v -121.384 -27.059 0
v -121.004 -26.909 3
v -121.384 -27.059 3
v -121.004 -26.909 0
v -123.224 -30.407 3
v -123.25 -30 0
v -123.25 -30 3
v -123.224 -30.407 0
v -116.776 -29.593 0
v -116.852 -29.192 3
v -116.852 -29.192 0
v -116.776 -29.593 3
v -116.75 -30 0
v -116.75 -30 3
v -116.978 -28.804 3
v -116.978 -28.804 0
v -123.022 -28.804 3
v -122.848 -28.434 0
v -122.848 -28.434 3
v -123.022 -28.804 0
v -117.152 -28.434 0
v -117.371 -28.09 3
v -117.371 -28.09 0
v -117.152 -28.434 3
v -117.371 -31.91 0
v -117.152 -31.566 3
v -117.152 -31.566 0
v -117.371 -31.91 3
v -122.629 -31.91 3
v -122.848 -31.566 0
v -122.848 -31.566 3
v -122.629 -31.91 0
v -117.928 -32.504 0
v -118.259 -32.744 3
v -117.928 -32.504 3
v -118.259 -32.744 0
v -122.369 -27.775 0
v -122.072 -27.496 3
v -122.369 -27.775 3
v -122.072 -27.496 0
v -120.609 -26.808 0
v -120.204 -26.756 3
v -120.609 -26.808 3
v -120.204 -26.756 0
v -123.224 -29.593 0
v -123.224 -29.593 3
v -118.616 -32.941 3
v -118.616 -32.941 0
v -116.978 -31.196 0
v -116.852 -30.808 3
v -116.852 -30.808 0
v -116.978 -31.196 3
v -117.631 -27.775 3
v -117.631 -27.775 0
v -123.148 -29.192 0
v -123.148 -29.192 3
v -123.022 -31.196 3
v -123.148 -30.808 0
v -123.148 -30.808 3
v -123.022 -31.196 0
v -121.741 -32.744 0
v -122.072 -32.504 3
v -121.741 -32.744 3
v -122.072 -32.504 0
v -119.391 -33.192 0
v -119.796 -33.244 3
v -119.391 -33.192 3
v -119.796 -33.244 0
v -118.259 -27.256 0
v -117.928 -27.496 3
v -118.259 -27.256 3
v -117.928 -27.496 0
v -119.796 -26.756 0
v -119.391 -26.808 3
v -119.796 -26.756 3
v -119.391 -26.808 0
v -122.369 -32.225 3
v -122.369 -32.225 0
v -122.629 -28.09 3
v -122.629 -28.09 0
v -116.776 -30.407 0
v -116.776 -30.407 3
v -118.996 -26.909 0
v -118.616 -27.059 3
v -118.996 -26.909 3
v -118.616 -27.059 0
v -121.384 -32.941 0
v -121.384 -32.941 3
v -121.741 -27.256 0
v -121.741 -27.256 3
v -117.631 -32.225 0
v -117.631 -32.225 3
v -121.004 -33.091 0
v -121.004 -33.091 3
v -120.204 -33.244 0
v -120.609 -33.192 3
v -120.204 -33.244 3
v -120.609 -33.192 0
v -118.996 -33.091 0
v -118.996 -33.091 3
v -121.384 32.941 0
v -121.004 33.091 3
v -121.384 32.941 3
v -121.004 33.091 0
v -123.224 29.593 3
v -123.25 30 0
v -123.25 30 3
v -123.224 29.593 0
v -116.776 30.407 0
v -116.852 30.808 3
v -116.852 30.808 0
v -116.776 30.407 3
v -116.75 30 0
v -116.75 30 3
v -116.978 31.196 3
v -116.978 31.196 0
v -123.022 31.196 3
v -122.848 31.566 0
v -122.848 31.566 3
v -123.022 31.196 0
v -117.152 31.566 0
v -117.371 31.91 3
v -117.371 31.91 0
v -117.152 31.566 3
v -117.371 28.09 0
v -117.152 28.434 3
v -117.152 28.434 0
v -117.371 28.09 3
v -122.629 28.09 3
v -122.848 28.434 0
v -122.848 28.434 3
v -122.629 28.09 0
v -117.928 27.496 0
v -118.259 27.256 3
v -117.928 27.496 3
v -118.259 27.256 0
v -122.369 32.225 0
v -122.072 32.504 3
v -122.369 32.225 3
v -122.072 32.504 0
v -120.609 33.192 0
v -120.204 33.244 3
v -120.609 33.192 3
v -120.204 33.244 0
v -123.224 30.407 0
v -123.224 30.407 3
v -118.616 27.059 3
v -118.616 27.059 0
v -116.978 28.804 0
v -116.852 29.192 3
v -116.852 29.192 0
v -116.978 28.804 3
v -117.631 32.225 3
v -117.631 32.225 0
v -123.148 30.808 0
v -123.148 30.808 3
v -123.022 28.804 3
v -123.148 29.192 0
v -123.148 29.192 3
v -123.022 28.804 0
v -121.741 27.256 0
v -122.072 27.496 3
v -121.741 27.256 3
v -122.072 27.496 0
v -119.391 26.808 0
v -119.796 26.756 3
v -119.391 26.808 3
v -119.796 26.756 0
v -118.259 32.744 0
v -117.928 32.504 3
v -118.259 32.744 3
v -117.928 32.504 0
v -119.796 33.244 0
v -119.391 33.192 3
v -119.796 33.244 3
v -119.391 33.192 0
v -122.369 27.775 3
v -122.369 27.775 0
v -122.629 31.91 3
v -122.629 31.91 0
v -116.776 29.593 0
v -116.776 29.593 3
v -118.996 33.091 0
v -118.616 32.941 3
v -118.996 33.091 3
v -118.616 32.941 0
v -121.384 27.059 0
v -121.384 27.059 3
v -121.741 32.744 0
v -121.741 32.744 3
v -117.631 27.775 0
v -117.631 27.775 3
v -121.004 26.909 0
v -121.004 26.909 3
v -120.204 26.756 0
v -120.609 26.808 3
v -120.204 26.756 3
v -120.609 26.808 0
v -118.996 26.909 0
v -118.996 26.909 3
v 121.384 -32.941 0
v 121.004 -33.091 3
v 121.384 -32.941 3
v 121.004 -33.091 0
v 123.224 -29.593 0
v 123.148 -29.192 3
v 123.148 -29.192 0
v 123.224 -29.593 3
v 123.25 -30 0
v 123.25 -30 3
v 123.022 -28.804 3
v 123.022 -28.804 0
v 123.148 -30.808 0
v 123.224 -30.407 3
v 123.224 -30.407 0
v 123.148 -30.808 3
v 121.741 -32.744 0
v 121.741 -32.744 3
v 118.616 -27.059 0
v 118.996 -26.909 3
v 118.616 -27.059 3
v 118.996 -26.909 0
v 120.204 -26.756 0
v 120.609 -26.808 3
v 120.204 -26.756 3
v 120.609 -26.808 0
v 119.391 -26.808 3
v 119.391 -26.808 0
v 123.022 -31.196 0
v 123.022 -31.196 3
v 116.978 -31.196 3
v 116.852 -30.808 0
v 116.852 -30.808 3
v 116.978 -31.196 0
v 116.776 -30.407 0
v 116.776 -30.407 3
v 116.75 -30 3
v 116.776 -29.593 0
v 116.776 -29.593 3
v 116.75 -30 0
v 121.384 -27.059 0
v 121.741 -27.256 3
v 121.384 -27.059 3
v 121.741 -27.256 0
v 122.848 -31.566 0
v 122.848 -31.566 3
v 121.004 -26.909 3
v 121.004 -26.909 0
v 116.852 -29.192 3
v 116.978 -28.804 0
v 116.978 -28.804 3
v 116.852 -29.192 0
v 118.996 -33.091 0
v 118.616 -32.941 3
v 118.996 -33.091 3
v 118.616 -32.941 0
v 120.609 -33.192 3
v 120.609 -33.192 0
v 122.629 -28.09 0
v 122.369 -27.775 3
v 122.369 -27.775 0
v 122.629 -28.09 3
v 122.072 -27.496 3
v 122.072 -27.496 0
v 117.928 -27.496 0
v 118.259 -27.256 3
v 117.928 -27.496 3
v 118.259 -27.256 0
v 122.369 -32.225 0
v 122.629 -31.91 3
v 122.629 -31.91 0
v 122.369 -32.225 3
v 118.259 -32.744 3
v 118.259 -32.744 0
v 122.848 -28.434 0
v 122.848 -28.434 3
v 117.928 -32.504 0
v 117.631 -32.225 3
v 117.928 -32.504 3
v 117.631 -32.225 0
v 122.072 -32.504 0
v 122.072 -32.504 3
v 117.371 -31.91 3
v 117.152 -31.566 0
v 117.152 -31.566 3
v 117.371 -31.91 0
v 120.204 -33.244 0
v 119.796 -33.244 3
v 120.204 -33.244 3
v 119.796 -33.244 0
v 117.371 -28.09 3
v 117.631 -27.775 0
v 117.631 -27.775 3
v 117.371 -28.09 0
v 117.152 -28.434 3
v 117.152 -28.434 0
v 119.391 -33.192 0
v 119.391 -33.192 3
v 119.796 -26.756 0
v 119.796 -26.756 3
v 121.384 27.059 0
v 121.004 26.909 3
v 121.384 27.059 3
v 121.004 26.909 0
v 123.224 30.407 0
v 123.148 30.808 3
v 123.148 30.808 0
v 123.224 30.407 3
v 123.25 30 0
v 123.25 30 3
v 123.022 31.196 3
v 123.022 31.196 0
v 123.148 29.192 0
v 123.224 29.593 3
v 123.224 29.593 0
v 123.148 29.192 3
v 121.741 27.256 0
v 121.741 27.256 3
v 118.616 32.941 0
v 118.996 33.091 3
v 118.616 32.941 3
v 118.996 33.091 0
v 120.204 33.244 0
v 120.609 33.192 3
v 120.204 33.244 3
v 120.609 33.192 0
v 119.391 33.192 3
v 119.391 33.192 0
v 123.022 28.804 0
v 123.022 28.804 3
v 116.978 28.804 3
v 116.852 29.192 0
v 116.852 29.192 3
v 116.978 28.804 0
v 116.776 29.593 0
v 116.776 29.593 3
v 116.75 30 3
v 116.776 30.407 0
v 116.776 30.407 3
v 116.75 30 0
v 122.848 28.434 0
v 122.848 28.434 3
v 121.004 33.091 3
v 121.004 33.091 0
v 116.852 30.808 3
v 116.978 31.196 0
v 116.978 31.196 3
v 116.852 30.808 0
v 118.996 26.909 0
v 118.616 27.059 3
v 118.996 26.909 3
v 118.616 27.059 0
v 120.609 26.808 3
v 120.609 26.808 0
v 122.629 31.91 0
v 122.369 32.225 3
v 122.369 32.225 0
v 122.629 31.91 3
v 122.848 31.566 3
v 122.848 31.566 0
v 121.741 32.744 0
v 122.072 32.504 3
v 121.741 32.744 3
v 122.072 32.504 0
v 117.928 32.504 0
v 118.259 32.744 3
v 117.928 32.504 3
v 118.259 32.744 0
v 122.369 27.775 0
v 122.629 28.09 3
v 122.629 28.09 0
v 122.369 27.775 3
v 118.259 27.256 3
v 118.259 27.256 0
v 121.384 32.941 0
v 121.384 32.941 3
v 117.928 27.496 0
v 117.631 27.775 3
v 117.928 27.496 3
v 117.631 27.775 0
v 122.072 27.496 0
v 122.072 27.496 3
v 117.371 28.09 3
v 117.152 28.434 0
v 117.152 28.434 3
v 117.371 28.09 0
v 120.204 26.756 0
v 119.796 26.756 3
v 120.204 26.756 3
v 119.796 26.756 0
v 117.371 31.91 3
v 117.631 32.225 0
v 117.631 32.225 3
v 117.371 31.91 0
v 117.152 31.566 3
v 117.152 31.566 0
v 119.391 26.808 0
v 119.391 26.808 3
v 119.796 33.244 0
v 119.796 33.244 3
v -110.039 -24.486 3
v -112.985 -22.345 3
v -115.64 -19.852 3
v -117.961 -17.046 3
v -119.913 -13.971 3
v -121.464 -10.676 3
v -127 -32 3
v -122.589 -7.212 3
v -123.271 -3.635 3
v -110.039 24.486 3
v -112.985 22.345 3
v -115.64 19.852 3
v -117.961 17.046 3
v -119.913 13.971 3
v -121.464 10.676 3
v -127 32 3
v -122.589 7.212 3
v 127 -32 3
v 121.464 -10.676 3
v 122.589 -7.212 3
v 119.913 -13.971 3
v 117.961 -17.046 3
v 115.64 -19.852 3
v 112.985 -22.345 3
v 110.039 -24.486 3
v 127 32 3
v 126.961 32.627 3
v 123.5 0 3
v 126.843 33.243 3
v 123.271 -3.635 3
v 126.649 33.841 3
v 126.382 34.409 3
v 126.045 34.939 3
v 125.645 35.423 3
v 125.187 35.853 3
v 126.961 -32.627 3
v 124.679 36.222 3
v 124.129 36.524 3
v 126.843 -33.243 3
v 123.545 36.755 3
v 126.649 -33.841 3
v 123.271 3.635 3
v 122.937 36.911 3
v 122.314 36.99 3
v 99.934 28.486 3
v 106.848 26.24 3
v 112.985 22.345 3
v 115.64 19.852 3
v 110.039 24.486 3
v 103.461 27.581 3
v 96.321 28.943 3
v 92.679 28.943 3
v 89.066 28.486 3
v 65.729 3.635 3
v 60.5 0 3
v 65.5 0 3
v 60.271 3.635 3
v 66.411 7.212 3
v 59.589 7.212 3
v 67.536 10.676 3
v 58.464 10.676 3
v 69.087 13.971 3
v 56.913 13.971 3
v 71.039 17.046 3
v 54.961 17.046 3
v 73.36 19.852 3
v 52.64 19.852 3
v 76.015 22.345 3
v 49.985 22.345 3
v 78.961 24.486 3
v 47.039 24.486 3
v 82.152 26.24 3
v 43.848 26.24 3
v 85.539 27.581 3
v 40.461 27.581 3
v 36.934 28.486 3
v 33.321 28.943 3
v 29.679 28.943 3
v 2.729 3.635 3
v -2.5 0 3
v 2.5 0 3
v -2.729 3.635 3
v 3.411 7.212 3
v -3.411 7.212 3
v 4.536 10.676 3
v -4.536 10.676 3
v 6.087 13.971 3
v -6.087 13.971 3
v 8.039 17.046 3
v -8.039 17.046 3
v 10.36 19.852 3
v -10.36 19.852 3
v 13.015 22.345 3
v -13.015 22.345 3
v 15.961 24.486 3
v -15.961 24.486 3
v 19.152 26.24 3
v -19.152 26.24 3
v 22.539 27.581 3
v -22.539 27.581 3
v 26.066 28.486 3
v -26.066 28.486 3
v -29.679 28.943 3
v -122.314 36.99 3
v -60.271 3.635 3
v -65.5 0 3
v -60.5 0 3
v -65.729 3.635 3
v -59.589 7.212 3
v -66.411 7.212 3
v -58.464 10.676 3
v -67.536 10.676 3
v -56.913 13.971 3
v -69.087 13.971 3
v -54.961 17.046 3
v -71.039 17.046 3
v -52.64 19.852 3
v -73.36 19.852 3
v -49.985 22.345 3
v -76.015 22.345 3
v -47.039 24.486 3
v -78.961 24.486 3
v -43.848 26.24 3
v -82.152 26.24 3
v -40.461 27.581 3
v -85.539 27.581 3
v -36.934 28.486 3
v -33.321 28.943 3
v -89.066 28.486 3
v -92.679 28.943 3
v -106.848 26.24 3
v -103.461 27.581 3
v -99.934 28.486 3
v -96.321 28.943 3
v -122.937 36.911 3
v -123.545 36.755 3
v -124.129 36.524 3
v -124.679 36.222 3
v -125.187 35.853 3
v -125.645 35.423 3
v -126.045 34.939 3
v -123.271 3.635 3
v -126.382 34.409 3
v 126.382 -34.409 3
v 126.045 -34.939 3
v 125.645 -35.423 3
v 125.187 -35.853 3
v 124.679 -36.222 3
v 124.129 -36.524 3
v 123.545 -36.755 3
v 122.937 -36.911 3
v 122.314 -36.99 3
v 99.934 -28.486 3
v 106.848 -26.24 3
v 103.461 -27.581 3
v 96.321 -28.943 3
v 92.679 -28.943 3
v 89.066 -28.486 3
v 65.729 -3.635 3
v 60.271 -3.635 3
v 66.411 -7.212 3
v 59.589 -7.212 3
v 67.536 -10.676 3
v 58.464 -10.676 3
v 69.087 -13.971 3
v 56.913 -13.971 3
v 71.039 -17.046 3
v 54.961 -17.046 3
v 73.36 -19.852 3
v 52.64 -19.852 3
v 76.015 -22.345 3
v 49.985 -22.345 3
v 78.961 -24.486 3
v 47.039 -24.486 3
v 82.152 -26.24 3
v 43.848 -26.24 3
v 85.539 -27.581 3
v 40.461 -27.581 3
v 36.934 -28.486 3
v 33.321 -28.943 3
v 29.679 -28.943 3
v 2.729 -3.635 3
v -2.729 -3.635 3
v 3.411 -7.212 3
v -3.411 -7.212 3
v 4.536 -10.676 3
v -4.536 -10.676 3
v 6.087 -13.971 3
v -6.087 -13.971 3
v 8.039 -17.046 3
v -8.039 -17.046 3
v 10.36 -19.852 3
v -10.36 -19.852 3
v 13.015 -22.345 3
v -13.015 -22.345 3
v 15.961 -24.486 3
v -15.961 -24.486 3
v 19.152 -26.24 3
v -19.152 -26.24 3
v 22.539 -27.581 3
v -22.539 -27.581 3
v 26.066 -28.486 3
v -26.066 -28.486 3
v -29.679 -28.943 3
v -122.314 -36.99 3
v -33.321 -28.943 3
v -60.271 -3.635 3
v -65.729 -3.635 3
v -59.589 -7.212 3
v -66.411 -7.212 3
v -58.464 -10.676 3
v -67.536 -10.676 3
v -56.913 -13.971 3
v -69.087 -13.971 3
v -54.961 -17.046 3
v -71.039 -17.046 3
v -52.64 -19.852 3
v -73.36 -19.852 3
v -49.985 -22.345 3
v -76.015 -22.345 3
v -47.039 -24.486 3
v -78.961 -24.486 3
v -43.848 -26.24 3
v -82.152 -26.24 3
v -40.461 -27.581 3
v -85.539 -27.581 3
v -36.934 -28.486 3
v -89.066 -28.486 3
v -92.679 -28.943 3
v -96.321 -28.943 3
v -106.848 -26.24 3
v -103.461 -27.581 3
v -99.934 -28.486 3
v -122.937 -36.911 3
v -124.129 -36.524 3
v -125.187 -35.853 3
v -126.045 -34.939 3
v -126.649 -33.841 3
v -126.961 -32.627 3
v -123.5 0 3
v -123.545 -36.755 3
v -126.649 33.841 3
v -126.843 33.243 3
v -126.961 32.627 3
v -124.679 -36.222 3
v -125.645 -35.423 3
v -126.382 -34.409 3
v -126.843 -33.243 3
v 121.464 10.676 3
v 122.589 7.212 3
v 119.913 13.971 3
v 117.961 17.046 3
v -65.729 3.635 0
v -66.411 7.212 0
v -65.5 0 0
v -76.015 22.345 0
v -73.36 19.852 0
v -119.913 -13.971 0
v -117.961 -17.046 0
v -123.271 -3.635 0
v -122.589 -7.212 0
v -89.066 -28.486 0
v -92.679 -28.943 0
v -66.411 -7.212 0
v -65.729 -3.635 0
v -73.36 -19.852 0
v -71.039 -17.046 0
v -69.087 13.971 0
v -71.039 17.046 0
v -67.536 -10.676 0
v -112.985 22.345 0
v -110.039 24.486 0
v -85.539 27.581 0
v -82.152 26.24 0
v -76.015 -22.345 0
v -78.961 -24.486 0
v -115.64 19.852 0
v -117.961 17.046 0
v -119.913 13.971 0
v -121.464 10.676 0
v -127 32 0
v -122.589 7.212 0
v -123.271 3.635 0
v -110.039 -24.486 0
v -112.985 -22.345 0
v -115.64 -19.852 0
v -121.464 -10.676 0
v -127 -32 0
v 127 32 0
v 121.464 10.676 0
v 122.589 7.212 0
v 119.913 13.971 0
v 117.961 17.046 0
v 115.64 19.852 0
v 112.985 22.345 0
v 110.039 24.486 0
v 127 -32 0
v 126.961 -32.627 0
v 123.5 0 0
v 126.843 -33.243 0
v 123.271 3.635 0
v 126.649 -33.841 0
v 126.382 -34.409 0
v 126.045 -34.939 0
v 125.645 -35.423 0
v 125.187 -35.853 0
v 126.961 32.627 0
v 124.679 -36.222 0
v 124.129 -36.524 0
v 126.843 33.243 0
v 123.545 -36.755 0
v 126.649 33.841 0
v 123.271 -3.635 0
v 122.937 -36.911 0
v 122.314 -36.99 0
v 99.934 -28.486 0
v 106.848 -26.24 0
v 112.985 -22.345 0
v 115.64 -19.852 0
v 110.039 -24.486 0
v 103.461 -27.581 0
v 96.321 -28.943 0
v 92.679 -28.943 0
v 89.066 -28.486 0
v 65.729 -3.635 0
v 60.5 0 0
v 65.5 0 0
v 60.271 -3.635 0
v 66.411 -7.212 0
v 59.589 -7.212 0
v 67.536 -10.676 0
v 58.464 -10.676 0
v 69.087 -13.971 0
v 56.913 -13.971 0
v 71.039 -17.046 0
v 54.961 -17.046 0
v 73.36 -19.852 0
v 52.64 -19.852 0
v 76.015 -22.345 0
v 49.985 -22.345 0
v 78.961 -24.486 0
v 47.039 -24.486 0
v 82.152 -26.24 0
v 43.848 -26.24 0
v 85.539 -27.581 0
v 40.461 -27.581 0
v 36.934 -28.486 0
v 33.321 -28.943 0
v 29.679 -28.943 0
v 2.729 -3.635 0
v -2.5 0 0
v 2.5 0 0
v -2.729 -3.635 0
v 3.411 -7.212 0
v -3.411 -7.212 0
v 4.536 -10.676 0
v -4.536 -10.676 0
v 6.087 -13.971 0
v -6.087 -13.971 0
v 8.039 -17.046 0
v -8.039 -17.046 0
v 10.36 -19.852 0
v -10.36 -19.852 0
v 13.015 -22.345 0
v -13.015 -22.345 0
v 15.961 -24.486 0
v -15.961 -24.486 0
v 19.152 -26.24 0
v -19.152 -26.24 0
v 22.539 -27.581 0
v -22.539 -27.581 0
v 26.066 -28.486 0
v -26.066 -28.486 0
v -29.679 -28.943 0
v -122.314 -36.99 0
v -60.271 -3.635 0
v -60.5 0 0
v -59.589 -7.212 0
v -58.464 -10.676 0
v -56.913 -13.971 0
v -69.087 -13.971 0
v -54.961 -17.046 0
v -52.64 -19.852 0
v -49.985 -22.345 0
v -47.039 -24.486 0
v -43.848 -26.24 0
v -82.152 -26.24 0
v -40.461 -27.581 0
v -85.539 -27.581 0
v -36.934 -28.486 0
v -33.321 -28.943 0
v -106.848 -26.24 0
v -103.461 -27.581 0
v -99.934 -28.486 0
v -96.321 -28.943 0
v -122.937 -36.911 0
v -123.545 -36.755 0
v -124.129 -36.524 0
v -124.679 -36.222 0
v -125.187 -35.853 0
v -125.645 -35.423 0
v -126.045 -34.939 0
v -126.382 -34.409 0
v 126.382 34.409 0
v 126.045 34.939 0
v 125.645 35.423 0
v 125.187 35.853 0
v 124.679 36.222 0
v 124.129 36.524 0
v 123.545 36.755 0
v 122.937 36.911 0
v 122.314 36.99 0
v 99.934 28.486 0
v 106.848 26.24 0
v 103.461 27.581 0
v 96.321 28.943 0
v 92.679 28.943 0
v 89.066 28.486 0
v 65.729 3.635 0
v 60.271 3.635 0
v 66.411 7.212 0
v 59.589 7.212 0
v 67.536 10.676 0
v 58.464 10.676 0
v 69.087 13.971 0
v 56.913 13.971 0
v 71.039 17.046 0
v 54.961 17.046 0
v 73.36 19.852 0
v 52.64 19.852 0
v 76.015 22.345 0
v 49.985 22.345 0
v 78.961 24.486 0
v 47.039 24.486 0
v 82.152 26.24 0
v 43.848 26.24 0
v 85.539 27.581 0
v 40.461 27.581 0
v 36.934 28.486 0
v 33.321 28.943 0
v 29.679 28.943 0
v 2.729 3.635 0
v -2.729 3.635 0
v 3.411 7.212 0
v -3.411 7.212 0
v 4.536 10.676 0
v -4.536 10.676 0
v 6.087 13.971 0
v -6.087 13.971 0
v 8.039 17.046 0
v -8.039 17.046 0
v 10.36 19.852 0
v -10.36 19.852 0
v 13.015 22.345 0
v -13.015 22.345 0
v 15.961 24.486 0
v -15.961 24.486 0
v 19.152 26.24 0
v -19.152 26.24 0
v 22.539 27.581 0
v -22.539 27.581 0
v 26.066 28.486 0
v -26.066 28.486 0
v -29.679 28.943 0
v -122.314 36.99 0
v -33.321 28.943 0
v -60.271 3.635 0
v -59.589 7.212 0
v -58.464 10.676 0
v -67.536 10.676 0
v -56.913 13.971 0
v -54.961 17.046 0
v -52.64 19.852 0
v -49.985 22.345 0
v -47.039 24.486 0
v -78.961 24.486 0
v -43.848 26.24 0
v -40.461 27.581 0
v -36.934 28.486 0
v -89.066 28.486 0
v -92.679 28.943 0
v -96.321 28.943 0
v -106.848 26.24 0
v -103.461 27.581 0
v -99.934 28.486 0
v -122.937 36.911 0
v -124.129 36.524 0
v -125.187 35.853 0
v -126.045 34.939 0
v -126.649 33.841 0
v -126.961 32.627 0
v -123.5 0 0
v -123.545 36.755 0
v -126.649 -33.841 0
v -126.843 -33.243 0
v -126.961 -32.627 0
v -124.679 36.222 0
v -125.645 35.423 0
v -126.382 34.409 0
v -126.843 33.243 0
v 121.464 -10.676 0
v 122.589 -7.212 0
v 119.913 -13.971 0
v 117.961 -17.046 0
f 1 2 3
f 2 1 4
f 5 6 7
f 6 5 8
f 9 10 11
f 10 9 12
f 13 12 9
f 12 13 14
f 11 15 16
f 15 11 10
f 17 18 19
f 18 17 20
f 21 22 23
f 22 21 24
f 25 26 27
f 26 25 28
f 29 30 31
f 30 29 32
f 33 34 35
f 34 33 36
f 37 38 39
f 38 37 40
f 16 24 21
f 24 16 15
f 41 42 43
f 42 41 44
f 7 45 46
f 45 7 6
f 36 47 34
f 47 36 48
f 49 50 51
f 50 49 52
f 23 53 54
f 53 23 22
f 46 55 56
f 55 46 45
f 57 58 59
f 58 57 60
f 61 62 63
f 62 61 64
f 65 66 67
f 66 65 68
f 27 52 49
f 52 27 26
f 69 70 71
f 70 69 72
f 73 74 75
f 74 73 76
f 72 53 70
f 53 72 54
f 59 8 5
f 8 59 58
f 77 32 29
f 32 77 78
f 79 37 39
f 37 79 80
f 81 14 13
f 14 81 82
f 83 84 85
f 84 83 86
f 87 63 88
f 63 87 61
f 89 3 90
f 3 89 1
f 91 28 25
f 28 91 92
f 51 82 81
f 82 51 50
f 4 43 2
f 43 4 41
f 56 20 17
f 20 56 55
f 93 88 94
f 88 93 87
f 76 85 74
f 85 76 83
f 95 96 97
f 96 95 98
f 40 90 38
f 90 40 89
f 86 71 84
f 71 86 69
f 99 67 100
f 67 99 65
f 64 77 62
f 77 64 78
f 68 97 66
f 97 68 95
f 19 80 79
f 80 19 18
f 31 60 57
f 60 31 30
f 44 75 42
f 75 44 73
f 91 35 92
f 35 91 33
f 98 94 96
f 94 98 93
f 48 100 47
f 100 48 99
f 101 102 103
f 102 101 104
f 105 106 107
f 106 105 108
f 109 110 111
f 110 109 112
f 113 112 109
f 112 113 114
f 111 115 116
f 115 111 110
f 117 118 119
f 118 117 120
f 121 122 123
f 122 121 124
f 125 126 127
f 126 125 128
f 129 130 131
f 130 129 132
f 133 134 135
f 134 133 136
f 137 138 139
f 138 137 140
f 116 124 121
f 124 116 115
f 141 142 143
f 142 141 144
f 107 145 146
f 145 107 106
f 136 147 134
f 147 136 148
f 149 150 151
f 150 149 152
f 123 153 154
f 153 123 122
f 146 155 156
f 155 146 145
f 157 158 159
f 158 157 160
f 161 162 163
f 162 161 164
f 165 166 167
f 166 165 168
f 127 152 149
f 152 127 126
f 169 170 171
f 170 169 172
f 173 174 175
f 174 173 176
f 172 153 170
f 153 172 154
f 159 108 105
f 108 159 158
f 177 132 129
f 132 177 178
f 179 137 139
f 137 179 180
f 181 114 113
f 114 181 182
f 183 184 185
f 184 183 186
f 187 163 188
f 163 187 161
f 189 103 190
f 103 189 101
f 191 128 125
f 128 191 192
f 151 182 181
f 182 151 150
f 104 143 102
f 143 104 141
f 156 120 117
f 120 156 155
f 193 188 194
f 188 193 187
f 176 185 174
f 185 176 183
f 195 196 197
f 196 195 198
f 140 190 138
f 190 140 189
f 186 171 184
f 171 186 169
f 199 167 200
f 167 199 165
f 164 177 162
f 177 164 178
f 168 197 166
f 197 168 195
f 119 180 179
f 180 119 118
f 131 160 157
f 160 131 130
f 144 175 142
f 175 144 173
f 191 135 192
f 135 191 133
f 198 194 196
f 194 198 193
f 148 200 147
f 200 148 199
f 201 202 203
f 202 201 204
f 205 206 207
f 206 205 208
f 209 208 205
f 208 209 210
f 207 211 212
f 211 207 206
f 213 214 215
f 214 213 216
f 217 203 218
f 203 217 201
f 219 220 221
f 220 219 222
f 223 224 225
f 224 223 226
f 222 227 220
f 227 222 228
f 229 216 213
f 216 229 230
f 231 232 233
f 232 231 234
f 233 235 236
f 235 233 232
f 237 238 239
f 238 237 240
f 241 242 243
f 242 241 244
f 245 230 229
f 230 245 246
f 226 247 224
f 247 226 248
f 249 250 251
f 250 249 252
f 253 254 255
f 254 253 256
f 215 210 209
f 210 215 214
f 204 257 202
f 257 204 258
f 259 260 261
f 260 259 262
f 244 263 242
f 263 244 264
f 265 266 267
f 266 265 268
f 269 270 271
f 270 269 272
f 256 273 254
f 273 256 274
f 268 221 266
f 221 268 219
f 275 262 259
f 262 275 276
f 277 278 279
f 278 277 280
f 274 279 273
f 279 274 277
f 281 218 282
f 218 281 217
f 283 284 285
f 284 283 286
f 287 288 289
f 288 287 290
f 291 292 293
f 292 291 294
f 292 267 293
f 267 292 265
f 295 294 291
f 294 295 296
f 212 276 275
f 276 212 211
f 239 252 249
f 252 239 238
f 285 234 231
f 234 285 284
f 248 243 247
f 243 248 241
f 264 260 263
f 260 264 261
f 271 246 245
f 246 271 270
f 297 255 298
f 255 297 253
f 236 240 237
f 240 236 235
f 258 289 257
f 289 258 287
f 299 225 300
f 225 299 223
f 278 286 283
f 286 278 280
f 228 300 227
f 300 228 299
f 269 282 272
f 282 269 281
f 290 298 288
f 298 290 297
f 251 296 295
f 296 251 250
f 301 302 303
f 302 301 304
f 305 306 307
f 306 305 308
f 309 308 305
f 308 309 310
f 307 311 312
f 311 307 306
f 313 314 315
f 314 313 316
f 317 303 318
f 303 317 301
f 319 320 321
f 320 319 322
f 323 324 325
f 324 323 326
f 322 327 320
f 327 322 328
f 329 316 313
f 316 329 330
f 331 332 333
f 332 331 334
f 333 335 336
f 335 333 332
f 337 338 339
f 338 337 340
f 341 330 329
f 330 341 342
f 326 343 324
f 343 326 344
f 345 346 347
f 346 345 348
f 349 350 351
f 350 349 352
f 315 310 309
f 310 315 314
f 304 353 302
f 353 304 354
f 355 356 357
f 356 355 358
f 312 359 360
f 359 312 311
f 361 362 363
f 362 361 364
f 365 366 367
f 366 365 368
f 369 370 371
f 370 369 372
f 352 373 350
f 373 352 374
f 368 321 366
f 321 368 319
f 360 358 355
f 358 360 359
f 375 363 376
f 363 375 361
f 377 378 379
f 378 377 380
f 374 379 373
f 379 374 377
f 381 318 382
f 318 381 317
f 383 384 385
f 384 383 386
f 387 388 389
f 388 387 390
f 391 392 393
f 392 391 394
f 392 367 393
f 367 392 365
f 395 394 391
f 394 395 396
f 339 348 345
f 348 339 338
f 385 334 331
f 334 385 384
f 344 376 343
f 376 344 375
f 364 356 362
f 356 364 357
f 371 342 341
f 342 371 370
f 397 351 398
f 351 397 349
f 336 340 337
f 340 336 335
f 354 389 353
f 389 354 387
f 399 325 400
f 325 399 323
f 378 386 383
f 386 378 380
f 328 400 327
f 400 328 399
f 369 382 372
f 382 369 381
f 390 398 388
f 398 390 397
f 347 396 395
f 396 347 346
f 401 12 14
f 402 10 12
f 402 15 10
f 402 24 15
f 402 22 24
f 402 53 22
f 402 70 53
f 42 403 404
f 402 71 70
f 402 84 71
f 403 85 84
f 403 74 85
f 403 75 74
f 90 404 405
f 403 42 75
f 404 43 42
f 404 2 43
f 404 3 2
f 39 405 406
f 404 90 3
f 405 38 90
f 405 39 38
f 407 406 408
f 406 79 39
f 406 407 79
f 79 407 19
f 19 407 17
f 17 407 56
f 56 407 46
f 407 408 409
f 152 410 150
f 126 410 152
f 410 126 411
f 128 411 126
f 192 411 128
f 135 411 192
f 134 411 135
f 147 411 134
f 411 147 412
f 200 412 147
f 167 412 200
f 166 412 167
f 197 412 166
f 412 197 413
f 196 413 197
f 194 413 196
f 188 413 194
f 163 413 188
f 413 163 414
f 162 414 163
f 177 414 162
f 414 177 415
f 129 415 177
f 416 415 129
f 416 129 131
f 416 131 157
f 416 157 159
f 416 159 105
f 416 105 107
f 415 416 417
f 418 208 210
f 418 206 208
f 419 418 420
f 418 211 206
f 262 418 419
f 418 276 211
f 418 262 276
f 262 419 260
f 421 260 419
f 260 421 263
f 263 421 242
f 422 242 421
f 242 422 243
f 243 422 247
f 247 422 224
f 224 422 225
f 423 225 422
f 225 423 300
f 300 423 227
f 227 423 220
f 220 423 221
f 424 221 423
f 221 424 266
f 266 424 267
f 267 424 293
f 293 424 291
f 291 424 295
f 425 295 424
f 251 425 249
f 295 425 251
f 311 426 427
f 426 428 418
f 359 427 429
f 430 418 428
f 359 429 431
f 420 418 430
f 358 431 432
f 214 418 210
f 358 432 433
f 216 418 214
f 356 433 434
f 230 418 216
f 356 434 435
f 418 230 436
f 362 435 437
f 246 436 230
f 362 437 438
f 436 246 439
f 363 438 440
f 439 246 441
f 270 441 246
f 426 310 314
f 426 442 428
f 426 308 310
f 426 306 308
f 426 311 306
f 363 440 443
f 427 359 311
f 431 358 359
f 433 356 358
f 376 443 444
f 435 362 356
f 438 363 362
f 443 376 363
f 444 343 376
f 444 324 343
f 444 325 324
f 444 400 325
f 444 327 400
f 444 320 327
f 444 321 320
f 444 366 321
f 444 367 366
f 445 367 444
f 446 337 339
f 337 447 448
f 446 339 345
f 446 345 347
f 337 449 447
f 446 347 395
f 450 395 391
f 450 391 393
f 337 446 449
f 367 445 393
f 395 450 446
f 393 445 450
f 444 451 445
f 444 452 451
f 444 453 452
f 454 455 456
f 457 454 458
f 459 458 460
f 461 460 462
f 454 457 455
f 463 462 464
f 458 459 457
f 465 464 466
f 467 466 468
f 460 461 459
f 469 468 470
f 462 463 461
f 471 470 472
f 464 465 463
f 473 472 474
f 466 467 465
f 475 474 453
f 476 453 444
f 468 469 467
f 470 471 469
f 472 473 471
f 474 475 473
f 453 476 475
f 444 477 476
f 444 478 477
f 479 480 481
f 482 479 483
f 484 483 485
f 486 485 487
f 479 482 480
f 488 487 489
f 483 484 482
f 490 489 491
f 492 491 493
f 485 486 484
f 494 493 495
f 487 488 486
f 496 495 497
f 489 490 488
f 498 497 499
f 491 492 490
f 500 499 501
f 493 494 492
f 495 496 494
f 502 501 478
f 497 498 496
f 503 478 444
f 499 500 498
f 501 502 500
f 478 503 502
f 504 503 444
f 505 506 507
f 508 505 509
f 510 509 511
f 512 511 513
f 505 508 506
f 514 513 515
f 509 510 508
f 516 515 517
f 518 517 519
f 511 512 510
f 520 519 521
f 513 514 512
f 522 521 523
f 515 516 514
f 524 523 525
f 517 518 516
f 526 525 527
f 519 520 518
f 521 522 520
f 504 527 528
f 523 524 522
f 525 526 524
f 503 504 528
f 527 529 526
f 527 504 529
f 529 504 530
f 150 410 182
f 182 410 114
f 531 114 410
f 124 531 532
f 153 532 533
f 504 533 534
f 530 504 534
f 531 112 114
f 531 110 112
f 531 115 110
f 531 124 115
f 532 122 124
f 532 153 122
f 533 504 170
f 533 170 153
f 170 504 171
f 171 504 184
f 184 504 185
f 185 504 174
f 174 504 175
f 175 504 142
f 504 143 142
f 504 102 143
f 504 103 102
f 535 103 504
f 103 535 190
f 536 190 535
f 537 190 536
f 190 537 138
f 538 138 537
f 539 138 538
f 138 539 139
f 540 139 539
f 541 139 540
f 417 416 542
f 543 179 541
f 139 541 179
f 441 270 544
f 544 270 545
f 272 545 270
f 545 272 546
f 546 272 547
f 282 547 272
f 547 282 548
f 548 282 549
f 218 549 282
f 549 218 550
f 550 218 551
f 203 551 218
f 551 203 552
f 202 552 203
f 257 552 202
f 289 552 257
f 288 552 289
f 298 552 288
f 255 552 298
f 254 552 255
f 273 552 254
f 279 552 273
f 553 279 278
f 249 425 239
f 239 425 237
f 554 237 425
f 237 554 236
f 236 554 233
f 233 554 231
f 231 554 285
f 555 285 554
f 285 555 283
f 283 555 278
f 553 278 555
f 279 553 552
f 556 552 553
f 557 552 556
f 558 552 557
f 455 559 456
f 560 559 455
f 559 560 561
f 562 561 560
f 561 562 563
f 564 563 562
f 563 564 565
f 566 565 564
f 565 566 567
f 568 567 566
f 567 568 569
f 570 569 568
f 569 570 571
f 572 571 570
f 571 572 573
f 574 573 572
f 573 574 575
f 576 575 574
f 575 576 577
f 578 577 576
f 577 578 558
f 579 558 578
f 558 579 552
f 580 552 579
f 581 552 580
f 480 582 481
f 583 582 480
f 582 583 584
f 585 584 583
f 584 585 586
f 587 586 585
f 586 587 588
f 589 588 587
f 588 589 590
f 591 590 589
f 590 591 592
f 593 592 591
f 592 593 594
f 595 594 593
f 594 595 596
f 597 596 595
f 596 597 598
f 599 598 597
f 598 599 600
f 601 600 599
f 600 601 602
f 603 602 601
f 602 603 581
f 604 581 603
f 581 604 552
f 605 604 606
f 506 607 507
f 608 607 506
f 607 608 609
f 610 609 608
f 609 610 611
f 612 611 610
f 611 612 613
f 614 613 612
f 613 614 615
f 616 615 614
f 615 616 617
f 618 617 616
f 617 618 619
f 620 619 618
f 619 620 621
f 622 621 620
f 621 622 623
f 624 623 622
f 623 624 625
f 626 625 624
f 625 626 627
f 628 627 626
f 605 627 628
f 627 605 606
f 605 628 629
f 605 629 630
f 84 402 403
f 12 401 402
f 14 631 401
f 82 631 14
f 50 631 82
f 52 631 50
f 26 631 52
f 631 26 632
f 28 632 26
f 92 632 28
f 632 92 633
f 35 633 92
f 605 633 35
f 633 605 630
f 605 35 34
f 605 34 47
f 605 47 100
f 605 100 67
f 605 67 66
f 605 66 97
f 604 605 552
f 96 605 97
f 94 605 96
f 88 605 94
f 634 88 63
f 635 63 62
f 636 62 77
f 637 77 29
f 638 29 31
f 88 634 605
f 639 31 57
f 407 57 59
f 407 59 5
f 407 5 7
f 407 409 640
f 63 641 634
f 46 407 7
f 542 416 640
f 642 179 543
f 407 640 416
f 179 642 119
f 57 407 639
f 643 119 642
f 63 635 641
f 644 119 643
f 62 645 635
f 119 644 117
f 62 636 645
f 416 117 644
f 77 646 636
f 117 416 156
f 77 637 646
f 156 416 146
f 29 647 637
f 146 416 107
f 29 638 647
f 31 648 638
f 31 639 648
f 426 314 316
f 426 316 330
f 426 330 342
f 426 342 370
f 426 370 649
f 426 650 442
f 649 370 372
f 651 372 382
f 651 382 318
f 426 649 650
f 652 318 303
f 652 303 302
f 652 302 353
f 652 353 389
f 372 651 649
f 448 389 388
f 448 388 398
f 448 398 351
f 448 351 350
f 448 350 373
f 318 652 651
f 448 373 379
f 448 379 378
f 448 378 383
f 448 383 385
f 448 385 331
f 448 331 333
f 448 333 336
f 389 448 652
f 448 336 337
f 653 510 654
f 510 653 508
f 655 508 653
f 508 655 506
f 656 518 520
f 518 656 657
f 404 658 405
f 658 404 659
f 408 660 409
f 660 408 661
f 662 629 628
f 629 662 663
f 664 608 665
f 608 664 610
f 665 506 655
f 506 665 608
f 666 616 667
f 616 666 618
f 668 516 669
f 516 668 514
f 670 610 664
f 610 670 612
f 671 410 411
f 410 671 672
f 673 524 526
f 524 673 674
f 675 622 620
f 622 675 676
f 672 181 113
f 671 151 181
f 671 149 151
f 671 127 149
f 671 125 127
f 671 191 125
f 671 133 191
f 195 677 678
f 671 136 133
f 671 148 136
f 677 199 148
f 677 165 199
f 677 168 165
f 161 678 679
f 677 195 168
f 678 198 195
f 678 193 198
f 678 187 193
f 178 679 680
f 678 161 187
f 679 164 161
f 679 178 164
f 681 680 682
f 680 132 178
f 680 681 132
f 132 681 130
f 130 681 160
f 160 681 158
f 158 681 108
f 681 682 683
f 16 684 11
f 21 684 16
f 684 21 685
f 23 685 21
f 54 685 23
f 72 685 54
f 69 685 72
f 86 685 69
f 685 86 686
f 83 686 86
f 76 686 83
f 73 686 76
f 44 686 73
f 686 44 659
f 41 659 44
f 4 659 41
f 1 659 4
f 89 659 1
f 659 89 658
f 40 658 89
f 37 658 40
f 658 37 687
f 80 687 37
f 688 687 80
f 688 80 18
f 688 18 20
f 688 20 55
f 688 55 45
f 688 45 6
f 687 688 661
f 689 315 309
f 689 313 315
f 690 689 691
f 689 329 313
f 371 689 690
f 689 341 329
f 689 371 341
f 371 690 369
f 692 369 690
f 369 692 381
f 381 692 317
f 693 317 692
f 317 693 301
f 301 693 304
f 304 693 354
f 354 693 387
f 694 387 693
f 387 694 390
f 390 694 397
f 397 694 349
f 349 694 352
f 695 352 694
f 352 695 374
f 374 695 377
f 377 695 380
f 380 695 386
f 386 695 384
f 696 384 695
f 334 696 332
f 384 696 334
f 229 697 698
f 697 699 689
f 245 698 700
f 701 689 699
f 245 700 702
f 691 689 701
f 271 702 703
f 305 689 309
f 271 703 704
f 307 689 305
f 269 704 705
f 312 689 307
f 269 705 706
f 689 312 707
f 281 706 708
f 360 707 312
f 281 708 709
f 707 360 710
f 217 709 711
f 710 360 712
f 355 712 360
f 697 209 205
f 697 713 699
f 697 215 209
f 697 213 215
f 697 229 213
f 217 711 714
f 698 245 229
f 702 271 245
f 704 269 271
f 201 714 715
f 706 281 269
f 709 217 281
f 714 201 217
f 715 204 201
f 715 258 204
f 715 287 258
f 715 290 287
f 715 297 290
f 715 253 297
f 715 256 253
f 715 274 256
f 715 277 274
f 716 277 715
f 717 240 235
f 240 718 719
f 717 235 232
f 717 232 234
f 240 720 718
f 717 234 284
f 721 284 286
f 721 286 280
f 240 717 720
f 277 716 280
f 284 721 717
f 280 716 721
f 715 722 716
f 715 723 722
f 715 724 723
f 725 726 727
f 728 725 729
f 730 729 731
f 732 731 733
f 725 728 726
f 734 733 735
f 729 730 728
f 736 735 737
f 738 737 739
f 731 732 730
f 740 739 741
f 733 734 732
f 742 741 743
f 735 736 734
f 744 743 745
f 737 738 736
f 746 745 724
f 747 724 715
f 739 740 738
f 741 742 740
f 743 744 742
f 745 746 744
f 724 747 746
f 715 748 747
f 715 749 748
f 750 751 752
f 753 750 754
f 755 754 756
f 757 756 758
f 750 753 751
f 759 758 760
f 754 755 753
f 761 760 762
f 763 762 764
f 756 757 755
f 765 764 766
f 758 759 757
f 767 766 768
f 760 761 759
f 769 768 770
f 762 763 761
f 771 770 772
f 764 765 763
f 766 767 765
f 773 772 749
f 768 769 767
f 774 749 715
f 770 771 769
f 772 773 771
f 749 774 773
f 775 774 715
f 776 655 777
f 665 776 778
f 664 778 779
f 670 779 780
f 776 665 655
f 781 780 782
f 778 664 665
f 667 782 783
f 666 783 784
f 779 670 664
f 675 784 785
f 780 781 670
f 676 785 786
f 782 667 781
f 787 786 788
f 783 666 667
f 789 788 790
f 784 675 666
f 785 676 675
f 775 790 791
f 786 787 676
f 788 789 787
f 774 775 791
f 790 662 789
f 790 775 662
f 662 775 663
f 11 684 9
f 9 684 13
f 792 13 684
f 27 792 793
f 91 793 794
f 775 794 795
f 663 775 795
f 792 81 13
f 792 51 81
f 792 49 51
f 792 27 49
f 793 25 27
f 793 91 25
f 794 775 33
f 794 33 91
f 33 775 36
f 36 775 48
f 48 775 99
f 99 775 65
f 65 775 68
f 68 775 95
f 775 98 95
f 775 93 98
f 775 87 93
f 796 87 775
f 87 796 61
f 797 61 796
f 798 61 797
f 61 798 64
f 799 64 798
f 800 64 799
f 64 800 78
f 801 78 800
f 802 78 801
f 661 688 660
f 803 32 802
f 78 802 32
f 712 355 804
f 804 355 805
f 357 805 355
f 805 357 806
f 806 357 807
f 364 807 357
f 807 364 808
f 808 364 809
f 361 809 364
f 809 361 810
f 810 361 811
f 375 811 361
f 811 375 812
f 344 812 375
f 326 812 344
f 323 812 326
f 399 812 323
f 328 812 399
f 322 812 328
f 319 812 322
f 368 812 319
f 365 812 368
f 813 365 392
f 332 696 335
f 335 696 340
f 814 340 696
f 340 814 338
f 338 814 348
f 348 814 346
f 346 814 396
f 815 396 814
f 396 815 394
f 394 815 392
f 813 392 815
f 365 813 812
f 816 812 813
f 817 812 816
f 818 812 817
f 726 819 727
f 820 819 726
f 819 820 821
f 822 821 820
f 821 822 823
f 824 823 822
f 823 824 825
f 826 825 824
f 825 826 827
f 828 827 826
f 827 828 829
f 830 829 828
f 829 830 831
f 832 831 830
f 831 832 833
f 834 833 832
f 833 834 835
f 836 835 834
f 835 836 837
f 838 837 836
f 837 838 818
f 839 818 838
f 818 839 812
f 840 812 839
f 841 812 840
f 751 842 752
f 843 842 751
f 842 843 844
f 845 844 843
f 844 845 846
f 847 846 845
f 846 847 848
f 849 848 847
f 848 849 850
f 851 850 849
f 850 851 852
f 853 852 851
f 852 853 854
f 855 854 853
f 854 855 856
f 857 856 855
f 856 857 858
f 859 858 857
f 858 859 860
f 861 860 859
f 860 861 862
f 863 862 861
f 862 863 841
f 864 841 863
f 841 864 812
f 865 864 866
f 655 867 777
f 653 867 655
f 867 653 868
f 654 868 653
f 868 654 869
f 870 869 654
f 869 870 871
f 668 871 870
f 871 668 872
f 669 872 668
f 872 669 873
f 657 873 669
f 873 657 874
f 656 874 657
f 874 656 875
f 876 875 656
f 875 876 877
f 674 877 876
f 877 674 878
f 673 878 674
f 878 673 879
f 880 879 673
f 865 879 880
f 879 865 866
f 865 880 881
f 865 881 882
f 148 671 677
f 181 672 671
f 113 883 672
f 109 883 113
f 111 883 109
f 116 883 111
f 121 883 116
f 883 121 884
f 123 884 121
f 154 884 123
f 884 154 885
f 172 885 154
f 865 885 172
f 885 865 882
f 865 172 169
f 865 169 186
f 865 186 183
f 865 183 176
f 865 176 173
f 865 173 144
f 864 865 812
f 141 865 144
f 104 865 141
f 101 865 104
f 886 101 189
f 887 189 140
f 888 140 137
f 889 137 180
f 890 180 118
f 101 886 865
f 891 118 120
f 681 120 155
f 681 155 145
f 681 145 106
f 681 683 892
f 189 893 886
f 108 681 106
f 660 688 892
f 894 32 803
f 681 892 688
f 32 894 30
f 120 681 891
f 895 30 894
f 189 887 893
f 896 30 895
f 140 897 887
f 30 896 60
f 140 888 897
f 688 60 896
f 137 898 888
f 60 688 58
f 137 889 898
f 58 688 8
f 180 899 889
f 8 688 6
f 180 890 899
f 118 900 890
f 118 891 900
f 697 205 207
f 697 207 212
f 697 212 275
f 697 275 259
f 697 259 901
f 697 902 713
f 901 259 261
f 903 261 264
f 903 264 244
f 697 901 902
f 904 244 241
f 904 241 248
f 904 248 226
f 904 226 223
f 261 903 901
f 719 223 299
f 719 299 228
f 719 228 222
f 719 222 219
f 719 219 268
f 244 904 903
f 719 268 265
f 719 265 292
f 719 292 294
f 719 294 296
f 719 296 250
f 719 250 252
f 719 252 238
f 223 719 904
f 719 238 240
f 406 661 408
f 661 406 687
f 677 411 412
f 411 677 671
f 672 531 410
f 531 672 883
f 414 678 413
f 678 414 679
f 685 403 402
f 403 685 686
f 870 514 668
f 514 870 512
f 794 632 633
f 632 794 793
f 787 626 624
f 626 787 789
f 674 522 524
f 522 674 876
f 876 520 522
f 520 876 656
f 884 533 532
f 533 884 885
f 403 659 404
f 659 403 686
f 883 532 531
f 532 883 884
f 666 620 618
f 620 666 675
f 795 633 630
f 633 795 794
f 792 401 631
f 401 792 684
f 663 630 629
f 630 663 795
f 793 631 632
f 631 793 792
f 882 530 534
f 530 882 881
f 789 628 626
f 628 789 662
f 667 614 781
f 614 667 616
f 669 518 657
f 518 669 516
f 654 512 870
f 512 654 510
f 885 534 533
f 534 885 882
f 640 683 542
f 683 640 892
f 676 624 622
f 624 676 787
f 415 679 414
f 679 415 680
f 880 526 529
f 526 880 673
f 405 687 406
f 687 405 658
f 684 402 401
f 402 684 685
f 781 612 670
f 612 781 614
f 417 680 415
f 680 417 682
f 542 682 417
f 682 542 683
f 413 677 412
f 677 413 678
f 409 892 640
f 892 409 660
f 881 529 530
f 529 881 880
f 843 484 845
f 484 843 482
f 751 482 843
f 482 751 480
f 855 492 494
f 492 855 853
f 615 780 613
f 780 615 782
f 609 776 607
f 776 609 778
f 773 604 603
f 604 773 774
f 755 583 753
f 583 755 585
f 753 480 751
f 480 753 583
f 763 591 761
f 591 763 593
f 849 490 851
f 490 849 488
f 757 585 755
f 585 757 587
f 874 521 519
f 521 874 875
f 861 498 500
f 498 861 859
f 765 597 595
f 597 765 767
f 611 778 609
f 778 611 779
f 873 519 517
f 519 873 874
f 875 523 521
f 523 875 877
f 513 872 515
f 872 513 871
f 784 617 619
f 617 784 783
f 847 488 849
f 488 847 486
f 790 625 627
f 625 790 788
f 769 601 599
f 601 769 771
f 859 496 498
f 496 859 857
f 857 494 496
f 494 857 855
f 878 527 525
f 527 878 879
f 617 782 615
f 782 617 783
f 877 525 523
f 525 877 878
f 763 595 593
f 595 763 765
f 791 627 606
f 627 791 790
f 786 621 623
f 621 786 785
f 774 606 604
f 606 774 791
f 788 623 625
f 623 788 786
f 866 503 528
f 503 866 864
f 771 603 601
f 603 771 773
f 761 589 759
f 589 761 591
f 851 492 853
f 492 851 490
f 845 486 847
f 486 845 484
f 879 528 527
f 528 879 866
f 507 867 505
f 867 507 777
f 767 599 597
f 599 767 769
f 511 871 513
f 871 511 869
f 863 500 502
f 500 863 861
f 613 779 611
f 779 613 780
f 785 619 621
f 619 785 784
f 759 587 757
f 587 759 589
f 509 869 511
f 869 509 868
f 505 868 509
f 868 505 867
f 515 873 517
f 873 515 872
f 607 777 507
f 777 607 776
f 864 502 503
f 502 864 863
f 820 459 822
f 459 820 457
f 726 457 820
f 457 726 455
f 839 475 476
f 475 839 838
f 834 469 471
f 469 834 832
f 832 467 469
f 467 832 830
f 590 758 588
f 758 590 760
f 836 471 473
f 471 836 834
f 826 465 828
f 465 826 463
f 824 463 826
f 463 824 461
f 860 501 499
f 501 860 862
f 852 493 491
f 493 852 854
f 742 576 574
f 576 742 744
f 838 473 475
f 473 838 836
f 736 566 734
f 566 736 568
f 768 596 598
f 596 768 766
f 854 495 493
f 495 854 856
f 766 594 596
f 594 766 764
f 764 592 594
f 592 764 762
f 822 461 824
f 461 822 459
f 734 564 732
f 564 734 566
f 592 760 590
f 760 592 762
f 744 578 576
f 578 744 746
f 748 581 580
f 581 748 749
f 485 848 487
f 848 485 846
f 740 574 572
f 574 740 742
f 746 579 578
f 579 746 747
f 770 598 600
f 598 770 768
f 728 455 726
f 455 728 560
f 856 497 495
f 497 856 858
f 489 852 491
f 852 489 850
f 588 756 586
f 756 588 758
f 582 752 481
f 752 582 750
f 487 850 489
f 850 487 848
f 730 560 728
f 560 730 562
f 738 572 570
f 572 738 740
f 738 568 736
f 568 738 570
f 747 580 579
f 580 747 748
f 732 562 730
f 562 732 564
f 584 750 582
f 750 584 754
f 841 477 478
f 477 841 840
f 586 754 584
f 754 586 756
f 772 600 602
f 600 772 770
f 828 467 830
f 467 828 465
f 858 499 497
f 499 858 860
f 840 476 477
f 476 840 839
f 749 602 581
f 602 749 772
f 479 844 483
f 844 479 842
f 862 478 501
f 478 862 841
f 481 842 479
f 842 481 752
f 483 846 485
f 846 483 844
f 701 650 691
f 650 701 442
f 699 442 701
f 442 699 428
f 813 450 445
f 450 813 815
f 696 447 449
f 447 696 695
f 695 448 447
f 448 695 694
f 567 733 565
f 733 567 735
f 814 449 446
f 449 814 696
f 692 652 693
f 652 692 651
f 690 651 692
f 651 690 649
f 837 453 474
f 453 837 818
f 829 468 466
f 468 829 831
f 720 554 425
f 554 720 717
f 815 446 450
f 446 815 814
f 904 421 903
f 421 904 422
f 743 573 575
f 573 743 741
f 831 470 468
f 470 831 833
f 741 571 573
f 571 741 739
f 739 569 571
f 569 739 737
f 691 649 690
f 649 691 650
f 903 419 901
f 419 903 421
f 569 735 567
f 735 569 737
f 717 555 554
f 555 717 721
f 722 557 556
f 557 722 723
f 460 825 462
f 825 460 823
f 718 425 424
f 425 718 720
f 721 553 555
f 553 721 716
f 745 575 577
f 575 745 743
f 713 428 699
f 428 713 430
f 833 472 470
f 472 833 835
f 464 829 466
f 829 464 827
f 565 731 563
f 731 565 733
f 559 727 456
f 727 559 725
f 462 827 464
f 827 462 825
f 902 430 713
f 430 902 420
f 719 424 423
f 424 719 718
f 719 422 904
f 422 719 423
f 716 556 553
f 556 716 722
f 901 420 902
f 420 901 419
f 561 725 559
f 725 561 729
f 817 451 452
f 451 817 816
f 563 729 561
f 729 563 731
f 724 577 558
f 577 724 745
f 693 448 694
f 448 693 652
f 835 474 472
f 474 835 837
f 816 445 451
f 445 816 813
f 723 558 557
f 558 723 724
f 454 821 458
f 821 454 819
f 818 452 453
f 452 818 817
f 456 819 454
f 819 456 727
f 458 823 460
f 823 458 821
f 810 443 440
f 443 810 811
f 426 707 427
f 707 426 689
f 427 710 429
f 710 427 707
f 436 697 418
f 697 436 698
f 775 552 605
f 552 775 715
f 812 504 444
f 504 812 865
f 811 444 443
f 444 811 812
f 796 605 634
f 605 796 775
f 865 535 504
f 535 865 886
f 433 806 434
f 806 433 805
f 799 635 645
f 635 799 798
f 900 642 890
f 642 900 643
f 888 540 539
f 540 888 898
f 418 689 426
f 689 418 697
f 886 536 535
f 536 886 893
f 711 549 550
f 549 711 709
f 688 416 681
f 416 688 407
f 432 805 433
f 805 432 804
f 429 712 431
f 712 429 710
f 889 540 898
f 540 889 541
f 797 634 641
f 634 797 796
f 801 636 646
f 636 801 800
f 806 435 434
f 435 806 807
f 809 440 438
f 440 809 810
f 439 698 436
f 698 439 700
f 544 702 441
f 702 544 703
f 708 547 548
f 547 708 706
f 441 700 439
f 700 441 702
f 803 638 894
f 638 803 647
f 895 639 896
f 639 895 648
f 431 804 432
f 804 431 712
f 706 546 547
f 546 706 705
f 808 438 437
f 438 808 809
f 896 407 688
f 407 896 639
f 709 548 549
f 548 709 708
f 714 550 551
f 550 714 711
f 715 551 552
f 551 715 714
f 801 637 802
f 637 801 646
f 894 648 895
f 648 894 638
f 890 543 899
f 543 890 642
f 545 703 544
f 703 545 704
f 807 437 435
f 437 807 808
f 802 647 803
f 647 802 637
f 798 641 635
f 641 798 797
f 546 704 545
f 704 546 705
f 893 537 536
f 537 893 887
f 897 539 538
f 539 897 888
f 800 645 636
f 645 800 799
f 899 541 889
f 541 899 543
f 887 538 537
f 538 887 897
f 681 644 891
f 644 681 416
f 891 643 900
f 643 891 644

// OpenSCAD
$fn = 50;


difference() {
	union() {
		hull() {
			translate(v = [-122.0000000000, 32.0000000000, 0]) {
				cylinder(h = 3, r = 5);
			}
			translate(v = [122.0000000000, 32.0000000000, 0]) {
				cylinder(h = 3, r = 5);
			}
			translate(v = [-122.0000000000, -32.0000000000, 0]) {
				cylinder(h = 3, r = 5);
			}
			translate(v = [122.0000000000, -32.0000000000, 0]) {
				cylinder(h = 3, r = 5);
			}
		}
	}
	union() {
		#translate(v = [-120.0000000000, -30.0000000000, -100.0000000000]) {
			cylinder(h = 200, r = 3.2500000000);
		}
		#translate(v = [-120.0000000000, 30.0000000000, -100.0000000000]) {
			cylinder(h = 200, r = 3.2500000000);
		}
		#translate(v = [120.0000000000, -30.0000000000, -100.0000000000]) {
			cylinder(h = 200, r = 3.2500000000);
		}
		#translate(v = [120.0000000000, 30.0000000000, -100.0000000000]) {
			cylinder(h = 200, r = 3.2500000000);
		}
		#translate(v = [-94.5000000000, 0, 0]) {
			cylinder(h = 3, r = 29.0000000000);
		}
		#translate(v = [-31.5000000000, 0, 0]) {
			cylinder(h = 3, r = 29.0000000000);
		}
		#translate(v = [31.5000000000, 0, 0]) {
			cylinder(h = 3, r = 29.0000000000);
		}
		#translate(v = [94.5000000000, 0, 0]) {
			cylinder(h = 3, r = 29.0000000000);
		}
	}
}
